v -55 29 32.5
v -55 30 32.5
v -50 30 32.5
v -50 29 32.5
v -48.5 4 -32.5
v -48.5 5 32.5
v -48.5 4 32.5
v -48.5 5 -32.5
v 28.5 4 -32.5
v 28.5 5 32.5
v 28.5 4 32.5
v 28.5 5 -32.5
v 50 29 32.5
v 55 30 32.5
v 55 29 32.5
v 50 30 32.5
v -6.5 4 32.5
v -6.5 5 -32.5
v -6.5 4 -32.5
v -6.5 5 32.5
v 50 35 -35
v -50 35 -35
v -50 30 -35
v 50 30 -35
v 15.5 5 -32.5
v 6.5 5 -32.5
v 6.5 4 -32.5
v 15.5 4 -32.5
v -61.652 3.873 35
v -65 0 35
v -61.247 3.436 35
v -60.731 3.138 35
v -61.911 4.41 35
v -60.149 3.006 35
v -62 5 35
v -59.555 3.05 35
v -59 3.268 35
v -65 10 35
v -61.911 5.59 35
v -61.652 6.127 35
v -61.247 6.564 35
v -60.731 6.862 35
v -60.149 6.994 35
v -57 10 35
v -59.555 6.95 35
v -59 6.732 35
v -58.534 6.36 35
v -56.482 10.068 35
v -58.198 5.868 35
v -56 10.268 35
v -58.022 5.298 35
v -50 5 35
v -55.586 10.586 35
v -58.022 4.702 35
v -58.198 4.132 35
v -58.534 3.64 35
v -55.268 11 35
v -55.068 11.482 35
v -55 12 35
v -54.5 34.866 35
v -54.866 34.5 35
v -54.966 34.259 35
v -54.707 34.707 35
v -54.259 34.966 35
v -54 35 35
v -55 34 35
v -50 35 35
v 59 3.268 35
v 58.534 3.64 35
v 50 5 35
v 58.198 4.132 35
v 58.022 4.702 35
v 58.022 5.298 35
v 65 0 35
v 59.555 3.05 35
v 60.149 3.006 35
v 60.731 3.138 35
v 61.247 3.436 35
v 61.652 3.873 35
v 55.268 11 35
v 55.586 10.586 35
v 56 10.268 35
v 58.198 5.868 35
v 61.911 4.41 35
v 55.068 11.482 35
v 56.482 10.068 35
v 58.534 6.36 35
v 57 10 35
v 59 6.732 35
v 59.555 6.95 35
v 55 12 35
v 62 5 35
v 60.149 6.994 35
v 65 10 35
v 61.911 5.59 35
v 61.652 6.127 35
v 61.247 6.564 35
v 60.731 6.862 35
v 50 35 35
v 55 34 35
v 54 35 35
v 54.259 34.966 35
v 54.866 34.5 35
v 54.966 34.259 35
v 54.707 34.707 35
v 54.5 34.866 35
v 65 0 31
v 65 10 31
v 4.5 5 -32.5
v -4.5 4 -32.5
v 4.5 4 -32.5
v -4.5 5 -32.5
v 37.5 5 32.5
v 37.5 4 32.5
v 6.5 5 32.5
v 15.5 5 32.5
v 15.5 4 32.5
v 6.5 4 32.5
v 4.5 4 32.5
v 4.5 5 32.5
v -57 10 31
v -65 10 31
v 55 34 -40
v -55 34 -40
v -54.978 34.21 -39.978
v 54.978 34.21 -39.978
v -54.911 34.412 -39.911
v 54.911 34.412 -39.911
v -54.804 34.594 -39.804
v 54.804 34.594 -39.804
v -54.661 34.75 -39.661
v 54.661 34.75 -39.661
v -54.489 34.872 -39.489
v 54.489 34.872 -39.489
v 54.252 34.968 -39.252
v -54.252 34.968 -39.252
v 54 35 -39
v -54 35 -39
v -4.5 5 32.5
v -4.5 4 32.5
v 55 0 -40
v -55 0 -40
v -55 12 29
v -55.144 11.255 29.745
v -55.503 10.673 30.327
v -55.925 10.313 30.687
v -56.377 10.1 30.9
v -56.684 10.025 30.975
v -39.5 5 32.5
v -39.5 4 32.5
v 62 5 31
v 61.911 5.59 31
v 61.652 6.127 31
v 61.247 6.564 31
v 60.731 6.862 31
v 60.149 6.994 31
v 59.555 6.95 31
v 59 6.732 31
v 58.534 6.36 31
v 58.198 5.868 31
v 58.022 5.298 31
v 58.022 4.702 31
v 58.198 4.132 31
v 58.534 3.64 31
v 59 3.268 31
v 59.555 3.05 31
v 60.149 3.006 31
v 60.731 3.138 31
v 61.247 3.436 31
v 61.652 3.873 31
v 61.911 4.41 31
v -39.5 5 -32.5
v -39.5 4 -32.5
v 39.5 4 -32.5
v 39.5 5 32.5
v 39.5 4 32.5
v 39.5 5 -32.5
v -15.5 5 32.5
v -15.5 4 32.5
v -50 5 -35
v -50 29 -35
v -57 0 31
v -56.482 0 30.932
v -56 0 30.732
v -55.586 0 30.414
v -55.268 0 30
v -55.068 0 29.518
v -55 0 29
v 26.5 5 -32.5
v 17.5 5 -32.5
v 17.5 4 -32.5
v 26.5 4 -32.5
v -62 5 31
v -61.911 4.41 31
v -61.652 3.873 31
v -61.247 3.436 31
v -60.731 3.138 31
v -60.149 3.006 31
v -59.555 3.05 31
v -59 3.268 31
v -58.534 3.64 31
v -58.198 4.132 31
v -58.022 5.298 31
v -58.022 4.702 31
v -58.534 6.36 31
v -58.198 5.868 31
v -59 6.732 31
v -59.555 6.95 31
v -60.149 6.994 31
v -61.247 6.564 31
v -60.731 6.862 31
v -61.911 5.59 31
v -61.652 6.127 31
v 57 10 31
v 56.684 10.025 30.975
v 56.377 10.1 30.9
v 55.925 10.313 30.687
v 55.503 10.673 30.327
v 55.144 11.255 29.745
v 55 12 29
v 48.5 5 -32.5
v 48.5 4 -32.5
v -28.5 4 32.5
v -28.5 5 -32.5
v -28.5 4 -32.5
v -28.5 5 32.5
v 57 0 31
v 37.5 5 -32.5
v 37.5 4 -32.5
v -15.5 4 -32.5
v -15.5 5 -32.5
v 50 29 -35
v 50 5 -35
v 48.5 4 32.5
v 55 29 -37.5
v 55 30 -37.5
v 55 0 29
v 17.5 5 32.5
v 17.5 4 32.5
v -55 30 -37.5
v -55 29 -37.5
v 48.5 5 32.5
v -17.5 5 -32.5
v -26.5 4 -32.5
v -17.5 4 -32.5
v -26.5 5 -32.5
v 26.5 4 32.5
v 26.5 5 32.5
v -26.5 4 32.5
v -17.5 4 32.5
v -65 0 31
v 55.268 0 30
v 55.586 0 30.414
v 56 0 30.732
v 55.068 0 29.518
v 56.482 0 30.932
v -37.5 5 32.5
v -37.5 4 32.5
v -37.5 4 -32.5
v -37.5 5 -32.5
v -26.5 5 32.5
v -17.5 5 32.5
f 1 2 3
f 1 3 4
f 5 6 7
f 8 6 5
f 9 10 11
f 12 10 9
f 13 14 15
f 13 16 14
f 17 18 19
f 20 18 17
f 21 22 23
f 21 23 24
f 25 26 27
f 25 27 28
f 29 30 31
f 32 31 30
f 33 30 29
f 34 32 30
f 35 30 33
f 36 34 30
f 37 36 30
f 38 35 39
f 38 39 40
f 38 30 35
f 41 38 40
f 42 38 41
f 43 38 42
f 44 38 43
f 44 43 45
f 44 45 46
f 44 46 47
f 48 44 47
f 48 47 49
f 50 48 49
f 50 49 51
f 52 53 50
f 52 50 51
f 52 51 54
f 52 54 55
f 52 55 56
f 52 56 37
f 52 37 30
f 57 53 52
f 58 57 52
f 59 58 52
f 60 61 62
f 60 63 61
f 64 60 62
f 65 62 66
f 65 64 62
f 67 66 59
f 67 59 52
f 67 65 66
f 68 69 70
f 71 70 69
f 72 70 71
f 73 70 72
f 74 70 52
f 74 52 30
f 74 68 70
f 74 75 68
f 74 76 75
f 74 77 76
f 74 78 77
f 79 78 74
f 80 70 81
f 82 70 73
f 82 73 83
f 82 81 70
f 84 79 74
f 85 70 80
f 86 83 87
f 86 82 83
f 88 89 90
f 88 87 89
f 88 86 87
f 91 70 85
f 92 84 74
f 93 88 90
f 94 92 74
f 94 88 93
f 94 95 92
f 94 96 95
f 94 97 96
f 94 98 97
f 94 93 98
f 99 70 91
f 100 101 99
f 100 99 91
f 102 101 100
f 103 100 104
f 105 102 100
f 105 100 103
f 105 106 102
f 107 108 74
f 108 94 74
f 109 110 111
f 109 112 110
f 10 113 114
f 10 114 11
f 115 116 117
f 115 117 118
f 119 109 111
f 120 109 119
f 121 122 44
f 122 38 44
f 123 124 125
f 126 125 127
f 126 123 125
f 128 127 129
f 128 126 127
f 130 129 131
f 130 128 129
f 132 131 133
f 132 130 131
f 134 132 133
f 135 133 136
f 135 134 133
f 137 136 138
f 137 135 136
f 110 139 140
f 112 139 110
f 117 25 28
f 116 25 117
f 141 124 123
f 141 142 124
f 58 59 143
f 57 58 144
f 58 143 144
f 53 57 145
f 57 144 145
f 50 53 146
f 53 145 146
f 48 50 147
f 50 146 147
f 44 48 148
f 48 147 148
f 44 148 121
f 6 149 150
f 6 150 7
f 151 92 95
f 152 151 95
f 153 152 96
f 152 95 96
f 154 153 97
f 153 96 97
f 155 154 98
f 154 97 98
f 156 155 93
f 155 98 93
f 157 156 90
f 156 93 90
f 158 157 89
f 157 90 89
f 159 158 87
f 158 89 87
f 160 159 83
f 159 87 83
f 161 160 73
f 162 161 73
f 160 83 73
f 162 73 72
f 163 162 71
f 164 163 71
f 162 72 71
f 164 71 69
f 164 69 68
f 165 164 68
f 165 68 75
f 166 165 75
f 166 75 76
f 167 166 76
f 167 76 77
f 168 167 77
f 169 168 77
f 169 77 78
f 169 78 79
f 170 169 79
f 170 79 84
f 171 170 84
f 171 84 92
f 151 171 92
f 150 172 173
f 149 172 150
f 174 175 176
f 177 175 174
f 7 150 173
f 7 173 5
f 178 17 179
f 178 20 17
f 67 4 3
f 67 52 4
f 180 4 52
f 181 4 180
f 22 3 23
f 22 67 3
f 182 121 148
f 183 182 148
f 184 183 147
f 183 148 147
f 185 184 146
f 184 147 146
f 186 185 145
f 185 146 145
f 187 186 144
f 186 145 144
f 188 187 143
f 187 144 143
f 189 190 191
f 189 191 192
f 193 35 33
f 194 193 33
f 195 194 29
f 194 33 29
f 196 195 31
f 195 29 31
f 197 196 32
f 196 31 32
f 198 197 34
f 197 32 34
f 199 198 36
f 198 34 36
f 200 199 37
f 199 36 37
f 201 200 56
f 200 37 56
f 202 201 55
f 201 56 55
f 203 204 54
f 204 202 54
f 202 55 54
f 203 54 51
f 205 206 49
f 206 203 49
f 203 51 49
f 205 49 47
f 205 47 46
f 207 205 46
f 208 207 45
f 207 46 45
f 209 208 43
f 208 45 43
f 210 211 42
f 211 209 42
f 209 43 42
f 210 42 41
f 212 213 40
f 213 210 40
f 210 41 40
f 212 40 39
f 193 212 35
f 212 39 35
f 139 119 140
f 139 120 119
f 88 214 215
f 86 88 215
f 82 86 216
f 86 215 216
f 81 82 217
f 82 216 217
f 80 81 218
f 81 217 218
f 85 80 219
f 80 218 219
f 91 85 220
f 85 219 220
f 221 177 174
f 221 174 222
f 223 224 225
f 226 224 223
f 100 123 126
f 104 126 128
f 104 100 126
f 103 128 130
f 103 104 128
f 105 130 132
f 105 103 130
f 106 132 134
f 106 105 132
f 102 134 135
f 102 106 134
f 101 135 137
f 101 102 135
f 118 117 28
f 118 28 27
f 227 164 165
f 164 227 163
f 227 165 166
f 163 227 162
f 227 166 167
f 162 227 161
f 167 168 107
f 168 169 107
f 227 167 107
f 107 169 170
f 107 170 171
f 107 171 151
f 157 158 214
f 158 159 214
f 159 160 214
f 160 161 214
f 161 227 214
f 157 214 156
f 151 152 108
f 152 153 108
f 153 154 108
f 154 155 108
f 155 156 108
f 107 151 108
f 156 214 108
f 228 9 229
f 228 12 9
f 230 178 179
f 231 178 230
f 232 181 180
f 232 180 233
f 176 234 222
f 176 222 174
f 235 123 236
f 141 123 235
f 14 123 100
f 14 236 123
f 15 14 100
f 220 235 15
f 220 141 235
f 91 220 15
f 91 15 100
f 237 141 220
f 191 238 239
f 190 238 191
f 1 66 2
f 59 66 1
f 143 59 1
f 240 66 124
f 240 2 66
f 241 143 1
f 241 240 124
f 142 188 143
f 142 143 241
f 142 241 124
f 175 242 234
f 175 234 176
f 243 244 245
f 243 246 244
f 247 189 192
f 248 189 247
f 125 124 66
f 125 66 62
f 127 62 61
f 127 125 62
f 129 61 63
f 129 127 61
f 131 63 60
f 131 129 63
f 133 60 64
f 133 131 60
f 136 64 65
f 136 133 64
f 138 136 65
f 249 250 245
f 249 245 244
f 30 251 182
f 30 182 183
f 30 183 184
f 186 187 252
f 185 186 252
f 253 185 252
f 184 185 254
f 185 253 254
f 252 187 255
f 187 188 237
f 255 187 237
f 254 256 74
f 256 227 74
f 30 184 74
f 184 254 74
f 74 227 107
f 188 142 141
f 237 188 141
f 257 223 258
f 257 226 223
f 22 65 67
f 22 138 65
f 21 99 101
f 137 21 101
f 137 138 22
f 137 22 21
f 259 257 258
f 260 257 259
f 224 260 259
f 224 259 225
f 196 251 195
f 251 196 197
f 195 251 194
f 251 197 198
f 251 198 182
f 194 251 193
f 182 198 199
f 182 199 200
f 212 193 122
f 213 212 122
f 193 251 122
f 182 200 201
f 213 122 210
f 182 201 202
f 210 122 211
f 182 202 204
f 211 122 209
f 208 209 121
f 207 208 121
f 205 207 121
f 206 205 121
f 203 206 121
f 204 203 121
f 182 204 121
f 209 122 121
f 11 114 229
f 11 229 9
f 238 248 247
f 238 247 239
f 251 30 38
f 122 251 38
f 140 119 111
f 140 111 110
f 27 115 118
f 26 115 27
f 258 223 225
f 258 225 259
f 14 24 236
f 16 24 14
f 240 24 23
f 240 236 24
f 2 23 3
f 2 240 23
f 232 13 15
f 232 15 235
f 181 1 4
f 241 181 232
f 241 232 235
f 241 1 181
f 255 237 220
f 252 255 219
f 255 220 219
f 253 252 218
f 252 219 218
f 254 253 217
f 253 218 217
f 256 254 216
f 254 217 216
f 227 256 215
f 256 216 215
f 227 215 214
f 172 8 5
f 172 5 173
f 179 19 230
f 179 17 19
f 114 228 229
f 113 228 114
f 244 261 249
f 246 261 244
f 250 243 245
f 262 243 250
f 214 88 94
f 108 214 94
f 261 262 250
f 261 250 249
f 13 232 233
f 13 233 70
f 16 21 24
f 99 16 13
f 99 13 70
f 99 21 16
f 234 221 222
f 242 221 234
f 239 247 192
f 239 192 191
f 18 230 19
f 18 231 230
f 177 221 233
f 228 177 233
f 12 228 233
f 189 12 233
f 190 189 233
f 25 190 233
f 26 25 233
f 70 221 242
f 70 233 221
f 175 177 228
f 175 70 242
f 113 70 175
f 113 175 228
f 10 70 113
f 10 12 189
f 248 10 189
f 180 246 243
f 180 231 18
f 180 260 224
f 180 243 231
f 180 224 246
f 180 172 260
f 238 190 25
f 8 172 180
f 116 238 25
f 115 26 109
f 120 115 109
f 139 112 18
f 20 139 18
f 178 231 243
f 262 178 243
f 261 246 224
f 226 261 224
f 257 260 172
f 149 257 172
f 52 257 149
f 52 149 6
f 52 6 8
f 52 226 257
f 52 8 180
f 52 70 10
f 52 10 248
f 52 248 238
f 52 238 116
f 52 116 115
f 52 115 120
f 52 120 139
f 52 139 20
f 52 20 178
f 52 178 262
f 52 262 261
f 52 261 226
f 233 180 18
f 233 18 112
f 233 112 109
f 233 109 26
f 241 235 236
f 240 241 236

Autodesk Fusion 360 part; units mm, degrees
sketch "Box base" plane through (0, 0, 0) normal (0, 1, 0) x (1, 0, 0)
  line L0 (55, -40) -> (-55, -40)
  line L1 (-55, -40) -> (-55, 40)
  line L2 (-55, 40) -> (55, 40)
  line L3 (55, 40) -> (55, -40)
  line L4 (55, -40) -> (-55, 40) construction
  line L5 (-55, -40) -> (55, 40) construction
  dimension "d3" = 110
  dimension "d4" = 80
extrude "Extrude2" add sketch "Box base" along normal blind 35
sketch "Center box" plane through (0, 35, 0) normal (0, 1, 0) x (-1, 0, 0)
  line L0 (-55, -40) -> (55, -40)
  line L1 (55, -40) -> (55, 40)
  line L2 (55, 40) -> (-55, 40)
  line L3 (-55, 40) -> (-55, -40)
  line L4 (-50, 35) -> (50, 35)
  line L5 (50, 35) -> (50, -35)
  line L6 (50, -35) -> (-50, -35)
  line L7 (-50, -35) -> (-50, 35)
  line L8 (-50, 35) -> (50, -35) construction
  line L9 (50, 35) -> (-50, -35) construction
  dimension "d9" = 100
  dimension "d10" = 70
extrude "Extrude3" cut sketch "Center box" against normal blind 30 contours L4 L5 L6 L7
sketch "open one end" plane through (0, 0, 40) normal (0, 0, 1) x (1, 0, 0)
  line L0 (-55, 0) -> (55, 0)
  line L1 (55, 0) -> (55, 35)
  line L2 (55, 35) -> (-55, 35)
  line L3 (-55, 35) -> (-55, 0)
  line L4 (-55, 35) -> (55, 35)
  line L5 (55, 35) -> (55, 0)
  line L6 (55, 0) -> (-55, 0)
  line L7 (-55, 0) -> (-55, 35)
extrude "Extrude4" cut sketch "open one end" against normal blind 5
sketch "line marker for slit" plane through (0, 0, 35) normal (0, 0, 1) x (1, 0, 0)
  line L0 (-50, 5) -> (-50, 35)
  line L1 (-50, 35) -> (-55, 35)
  line L2 (-55, 35) -> (-55, 0)
  line L3 (-55, 0) -> (55, 0)
  line L4 (55, 0) -> (55, 35)
  line L5 (55, 35) -> (50, 35)
  line L6 (50, 35) -> (50, 5)
  line L7 (-50, 5) -> (-50, 29) construction
  line L8 (-50, 29) -> (-55, 29) construction
  line L9 (-55, 0) -> (-55, 35)
  line L10 (50, 5) -> (-50, 5)
  dimension "d21" = 24
sketch "Slit for diffuser" plane through (-55, 0, 0) normal (-1, 0, 0) x (0, 0, 1)
  line L0 (35, 0) -> (35, 35)
  line L1 (35, 35) -> (-40, 35)
  line L2 (-40, 35) -> (-40, 0)
  line L3 (-40, 0) -> (35, 0)
  line L4 (-40, 29) -> (35, 29) construction
  line L5 (-37.5, 30) -> (32.5, 30)
  line L6 (32.5, 30) -> (32.5, 29)
  line L7 (32.5, 29) -> (-37.5, 29)
  line L8 (-37.5, 29) -> (-37.5, 30)
  dimension "d22" = 70
  dimension "d23" = 1
extrude "Extrude6" cut sketch "Slit for diffuser" against normal up to surface (110 mm away) contours L5 L6 L7 L8
sketch "Sketch8" plane through (0, 35, 0) normal (0, 1, 0) x (-1, 0, 0)
  line L0 (4.5, -32.5) -> (-4.5, -32.5)
  line L1 (-4.5, -32.5) -> (-4.5, 32.5)
  line L2 (-4.5, 32.5) -> (4.5, 32.5)
  line L3 (4.5, 32.5) -> (4.5, -32.5)
  line L4 (4.5, -32.5) -> (-4.5, 32.5) construction
  line L5 (-4.5, -32.5) -> (4.5, 32.5) construction
  dimension "d28" = 9
  dimension "d29" = 65
extrude "Extrude7" cut sketch "Sketch8" against normal blind 31
pattern_linear "R-Pattern1" count 9 spacing 11 along (-1, 0, 0) both ways of "Extrude7"
sketch "nut holder" plane through (0, 0, 35) normal (0, 0, 1) x (1, 0, 0)
  line L0 (55, 10) -> (65, 10)
  line L1 (65, 10) -> (65, 0)
  line L2 (65, 0) -> (55, 0)
  line L3 (55, 0) -> (55, 10)
  circle A0 centre (60, 5) radius 2
  line L4 (60, 10) -> (60, 0) construction
  line L5 (65, 5) -> (55, 5) construction
  dimension "d36" = 10
  dimension "d37" = 10
  dimension "d43" = 4
extrude "Extrude8" add sketch "nut holder" against normal blind 4 contours L0 L1 L2 L3 | A0
extrude "Extrude9" cut sketch "nut holder" against normal blind 4 contours A0
fillet "Fillet1" radius 2 2 edges at (55, 10, 33) (55, 5, 31)
mirror "Mirror2" about plane through (0, 0, 0) normal (1, 0, 0) of "Extrude8", "Extrude9"
fillet "Fillet3" radius 2 2 edges at (-55, 10, 33) (-55, 5, 31)
fillet "Fillet4" radius 1 3 edges at (0, 35, -40) (-55, 35, -2.5) (55, 35, -2.5)
